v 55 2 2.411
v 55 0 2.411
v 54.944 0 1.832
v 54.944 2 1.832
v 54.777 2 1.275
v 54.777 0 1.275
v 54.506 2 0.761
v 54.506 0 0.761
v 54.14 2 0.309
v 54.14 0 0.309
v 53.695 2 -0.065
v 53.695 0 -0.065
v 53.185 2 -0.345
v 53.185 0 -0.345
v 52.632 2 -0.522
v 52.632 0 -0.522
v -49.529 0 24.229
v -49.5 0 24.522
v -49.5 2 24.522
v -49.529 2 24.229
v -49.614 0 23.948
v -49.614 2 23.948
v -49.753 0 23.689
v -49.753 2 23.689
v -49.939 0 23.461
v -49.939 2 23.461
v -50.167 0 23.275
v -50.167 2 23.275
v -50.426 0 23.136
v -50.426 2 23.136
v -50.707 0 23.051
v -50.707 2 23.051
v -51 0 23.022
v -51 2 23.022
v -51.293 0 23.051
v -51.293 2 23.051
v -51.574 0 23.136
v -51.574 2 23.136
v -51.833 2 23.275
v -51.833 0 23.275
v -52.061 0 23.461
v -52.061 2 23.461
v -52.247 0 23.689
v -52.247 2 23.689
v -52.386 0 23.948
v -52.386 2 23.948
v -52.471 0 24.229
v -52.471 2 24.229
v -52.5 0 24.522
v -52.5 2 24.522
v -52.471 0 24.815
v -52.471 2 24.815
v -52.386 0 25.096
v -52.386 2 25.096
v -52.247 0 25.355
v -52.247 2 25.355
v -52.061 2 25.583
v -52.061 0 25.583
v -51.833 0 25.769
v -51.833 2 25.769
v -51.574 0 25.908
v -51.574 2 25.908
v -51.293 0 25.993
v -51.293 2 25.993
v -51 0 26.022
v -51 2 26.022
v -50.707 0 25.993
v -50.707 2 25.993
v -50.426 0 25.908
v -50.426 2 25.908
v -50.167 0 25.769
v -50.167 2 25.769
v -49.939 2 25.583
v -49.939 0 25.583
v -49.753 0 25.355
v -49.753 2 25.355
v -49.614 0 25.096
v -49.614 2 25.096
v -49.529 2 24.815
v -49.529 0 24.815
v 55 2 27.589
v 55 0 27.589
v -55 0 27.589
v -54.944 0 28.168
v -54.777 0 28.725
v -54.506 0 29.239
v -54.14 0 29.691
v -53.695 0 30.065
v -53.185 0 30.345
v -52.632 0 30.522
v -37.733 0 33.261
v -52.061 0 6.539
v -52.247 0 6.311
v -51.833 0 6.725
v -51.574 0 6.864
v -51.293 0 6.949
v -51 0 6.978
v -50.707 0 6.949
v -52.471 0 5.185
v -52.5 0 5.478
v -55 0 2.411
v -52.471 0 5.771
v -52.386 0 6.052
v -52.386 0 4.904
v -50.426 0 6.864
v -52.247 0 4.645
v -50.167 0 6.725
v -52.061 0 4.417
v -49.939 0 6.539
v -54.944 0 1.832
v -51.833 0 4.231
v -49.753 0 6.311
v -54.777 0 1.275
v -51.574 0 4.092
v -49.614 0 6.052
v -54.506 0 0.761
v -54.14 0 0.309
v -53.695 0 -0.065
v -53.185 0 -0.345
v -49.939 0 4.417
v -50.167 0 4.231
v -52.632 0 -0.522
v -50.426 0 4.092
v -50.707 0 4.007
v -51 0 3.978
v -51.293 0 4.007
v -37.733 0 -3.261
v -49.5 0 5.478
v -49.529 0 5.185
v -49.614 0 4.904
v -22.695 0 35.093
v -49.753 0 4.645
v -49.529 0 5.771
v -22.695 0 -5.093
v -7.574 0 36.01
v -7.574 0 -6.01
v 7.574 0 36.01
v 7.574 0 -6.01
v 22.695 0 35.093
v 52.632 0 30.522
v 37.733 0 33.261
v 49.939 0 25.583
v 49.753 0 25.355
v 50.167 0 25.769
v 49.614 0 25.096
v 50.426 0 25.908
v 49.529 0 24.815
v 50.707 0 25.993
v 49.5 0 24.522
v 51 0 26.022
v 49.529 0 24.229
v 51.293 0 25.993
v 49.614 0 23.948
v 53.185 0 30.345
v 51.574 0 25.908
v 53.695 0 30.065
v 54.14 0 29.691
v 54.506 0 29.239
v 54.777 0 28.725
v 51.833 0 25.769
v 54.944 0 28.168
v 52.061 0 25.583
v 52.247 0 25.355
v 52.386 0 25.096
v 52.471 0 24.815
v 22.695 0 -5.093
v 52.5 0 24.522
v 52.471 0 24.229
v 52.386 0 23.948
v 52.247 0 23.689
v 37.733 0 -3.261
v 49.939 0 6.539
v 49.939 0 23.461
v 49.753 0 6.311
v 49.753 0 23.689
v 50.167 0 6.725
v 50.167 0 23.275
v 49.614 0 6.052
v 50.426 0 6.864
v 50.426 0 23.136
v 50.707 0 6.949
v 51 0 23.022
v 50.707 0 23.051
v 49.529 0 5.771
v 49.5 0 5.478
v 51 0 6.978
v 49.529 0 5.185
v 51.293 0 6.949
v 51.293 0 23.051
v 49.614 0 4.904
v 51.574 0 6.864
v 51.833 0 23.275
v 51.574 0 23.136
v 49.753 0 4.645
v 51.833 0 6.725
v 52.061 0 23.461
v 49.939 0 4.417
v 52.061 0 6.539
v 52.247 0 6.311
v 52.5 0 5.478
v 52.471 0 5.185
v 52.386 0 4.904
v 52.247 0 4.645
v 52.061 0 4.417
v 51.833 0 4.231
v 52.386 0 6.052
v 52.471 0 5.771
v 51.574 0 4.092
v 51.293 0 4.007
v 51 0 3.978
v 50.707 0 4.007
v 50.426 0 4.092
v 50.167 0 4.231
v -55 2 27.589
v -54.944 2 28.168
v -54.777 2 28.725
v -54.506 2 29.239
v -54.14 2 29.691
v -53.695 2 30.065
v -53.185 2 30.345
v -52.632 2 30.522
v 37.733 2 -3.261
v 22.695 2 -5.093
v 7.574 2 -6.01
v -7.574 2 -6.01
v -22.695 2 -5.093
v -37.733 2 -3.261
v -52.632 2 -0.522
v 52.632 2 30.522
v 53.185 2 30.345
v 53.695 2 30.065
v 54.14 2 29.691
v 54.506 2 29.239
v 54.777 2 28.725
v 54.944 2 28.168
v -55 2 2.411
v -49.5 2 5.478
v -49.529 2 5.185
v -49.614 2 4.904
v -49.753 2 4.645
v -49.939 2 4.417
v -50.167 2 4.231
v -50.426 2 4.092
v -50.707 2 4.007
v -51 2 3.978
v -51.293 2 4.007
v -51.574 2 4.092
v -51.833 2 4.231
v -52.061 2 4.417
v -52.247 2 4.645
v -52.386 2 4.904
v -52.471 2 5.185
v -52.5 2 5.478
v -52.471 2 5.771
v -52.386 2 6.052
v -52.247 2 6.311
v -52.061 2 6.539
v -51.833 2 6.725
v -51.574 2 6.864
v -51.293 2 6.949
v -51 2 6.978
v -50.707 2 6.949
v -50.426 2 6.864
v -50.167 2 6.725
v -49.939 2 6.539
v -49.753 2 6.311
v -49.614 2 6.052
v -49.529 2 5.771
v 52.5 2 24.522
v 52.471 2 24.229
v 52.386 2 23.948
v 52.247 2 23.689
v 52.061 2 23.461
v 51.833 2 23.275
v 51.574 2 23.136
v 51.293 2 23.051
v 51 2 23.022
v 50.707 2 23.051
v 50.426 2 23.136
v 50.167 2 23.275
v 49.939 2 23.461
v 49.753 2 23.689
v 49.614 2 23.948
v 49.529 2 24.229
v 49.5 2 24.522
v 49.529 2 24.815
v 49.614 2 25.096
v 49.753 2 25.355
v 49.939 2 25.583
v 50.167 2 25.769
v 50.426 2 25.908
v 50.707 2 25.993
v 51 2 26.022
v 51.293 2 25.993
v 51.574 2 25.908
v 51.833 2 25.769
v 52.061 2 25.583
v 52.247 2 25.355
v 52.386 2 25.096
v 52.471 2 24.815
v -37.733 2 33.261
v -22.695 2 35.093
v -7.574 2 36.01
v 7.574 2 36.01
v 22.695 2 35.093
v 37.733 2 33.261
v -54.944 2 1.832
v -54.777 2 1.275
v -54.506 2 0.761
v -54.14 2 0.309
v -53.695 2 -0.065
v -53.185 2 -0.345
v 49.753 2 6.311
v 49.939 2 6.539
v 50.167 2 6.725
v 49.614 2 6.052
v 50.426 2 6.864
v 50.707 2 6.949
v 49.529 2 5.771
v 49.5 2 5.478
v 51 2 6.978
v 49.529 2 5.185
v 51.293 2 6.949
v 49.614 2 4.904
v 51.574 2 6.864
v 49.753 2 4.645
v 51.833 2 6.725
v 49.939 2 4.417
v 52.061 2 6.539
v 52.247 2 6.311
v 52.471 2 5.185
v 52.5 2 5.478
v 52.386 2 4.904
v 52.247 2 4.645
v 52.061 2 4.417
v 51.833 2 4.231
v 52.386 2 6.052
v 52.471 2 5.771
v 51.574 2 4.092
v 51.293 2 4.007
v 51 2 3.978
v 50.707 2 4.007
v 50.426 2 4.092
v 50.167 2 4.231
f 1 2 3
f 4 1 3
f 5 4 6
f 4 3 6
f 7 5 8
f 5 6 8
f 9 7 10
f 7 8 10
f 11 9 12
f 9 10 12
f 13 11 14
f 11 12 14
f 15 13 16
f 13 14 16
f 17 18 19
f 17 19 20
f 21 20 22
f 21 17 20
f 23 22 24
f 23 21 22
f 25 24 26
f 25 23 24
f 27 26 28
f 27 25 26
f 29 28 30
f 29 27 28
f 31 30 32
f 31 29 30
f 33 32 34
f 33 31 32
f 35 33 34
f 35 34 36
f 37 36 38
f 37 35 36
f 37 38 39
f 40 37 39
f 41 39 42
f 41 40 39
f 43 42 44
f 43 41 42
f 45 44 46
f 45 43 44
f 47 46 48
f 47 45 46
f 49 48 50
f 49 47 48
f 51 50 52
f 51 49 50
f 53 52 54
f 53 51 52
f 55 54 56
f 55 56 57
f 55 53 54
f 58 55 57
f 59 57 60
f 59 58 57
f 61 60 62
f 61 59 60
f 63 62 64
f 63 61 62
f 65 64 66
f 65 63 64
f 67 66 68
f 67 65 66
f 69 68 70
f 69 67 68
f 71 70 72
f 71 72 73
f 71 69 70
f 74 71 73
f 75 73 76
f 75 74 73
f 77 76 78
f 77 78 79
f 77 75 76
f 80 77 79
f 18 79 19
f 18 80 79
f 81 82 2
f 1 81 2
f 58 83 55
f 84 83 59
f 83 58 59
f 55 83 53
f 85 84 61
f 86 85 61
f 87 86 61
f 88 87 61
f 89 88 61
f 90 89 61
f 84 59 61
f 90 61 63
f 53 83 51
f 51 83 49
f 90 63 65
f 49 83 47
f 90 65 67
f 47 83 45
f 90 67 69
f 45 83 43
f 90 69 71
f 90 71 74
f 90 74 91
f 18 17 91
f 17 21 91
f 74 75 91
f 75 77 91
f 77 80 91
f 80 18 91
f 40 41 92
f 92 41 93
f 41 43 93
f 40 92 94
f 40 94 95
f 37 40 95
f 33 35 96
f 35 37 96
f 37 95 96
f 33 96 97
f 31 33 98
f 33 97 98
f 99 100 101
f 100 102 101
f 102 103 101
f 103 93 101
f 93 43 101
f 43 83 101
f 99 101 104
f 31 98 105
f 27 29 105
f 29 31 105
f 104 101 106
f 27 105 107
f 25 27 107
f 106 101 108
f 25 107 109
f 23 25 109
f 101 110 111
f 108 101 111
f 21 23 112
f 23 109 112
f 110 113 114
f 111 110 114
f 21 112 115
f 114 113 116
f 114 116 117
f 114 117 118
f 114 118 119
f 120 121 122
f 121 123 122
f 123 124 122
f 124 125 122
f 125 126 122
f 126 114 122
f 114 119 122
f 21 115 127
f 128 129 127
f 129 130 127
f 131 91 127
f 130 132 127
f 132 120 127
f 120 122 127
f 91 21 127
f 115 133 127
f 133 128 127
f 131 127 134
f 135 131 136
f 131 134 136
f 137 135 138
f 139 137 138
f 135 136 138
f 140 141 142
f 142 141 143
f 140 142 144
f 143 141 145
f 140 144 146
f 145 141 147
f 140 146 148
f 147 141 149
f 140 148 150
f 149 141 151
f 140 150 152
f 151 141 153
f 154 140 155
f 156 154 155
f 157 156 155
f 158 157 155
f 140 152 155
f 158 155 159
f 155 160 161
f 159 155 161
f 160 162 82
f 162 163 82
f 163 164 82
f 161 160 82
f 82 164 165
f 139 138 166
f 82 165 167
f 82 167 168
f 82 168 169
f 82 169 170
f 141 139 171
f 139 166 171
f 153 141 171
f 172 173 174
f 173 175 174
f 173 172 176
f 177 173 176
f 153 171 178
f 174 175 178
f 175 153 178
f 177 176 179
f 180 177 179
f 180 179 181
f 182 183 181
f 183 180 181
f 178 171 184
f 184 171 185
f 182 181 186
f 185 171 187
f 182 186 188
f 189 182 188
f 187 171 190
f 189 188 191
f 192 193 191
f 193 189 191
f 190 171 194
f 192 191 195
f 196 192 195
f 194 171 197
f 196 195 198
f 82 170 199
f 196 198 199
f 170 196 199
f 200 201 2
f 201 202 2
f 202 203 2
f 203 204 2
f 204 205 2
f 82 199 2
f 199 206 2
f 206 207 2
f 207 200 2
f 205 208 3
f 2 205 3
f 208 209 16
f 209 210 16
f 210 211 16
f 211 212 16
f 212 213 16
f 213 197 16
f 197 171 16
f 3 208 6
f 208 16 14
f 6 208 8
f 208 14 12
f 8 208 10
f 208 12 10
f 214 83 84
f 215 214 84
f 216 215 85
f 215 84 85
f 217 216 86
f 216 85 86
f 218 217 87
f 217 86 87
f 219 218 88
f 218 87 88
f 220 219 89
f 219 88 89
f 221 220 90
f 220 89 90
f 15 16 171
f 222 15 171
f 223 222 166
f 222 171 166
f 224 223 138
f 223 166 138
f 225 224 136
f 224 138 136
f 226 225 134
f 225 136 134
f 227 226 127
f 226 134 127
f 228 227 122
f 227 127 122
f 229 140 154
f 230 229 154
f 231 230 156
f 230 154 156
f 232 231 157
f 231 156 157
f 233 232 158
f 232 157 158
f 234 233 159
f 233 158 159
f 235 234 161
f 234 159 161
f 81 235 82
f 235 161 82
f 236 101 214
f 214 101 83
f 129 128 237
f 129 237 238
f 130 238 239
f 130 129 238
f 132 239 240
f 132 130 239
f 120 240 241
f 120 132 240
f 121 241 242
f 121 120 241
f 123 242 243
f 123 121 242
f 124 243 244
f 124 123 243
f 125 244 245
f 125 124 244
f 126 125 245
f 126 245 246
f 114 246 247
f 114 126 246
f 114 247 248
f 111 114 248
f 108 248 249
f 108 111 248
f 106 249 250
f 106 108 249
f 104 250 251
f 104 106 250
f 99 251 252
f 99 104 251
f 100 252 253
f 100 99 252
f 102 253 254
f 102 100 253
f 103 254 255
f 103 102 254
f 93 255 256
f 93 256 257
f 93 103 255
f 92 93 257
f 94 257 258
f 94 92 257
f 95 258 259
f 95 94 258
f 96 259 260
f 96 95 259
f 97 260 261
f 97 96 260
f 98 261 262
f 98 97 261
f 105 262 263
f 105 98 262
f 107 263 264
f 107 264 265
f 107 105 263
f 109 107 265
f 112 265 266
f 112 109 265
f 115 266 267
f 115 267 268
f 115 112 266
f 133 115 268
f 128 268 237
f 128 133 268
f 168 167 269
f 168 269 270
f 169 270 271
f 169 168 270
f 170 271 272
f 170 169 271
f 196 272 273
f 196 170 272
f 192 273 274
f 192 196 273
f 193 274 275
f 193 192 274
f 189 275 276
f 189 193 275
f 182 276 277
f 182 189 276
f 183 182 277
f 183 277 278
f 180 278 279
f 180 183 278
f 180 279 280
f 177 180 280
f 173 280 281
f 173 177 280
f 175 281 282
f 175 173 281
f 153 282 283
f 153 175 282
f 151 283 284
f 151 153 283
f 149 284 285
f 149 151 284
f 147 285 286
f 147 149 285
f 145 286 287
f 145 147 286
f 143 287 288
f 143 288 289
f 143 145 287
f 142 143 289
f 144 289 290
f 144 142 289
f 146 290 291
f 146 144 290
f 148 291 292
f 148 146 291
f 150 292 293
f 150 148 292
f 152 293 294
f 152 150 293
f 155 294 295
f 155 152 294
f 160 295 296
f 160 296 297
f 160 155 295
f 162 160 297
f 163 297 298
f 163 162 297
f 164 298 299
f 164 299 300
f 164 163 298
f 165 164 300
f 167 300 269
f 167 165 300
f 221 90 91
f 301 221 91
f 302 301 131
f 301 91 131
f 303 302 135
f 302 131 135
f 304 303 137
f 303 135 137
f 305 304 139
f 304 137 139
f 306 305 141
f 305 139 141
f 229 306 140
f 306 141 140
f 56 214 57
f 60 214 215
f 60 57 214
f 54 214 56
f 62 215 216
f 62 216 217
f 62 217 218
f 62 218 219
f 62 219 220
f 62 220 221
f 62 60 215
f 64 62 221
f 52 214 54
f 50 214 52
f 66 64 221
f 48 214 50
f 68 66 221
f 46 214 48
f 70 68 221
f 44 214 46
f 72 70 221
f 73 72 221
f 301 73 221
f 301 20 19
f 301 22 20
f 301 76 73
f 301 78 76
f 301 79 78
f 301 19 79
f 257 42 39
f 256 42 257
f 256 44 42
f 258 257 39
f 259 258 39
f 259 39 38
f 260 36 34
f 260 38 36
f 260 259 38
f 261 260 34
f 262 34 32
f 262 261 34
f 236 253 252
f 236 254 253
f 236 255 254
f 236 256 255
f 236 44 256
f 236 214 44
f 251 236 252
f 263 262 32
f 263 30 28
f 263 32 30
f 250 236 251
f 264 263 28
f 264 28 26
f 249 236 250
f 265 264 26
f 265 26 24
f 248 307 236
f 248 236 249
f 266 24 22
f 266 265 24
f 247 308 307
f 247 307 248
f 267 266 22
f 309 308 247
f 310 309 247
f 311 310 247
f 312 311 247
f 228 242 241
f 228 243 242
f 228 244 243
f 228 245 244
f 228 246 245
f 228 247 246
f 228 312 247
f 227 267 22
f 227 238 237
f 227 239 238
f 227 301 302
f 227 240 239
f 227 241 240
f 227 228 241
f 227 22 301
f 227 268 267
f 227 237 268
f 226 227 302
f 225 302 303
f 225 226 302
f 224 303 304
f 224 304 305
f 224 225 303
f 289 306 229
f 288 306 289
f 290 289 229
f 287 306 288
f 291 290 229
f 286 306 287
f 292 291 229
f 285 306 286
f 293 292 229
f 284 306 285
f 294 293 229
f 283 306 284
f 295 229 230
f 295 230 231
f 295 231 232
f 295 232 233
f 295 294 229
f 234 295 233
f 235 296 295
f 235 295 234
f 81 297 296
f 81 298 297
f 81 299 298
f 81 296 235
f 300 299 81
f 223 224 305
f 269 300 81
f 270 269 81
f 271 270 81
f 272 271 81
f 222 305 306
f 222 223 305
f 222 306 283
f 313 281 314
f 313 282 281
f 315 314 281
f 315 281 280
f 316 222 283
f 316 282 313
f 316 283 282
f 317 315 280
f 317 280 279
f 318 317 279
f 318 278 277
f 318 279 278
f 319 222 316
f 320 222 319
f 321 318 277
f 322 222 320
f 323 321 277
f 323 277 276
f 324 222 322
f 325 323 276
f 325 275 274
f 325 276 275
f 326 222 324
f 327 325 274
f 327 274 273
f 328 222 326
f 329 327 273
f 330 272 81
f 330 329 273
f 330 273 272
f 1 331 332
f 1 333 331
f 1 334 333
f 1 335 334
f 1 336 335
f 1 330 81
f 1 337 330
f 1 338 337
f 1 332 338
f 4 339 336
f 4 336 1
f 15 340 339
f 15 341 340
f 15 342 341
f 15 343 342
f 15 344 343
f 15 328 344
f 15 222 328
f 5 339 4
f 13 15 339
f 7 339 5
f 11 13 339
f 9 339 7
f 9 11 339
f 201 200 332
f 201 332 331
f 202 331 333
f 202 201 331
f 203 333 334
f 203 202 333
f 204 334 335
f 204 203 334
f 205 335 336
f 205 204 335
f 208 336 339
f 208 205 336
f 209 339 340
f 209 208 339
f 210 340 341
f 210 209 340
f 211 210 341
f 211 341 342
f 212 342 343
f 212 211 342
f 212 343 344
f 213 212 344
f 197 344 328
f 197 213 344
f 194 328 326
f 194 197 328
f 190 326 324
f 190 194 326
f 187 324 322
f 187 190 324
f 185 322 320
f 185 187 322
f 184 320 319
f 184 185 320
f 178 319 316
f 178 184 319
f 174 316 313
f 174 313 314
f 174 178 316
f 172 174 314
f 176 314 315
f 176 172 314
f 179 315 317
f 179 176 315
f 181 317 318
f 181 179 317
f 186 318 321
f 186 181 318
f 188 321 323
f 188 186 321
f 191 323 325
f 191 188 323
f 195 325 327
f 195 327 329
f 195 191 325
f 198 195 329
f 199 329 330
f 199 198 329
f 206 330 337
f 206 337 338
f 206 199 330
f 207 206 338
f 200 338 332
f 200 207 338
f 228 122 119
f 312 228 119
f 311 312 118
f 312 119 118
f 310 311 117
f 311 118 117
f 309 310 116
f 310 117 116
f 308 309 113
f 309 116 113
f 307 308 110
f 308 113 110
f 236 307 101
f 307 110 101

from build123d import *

# Parameters (mm, degrees)
SKETCH_1_R      = 1.5
EXTRUDE_1_DEPTH = 2


with BuildPart() as part:
    # Эскиз1 → Бобышка-Вытянуть1 (new body)
    with BuildSketch(Plane(origin=(0, 0, 0), x_dir=(1, 0, 0), z_dir=(0, 1, 0))):
        with BuildLine():
            Line((-55, -2.410684892), (-55, -27.589315108))
            ThreePointArc((-55, -27.589315108), (-54.333959816, -29.474157695), (-52.631578947, -30.52207968))
            ThreePointArc((-52.631578947, -30.52207968), (0, -36.125032035), (52.631578947, -30.52207968))
            ThreePointArc((52.631578947, -30.52207968), (54.333959816, -29.474157695), (55, -27.589315108))
            Line((55, -27.589315108), (55, -2.410684892))
            ThreePointArc((55, -2.410684892), (54.333959816, -0.525842305), (52.631578947, 0.52207968))
            ThreePointArc((52.631578947, 0.52207968), (0, 6.125032035), (-52.631578947, 0.52207968))
            ThreePointArc((-52.631578947, 0.52207968), (-54.333959816, -0.525842305), (-55, -2.410684892))
        make_face()
        with Locations((-51, -5.47792032)):
            Circle(SKETCH_1_R, mode=Mode.SUBTRACT)
        with Locations((-51, -24.52207968)):
            Circle(SKETCH_1_R, mode=Mode.SUBTRACT)
        with Locations((51, -5.47792032)):
            Circle(SKETCH_1_R, mode=Mode.SUBTRACT)
        with Locations((51, -24.52207968)):
            Circle(SKETCH_1_R, mode=Mode.SUBTRACT)
    extrude(amount=EXTRUDE_1_DEPTH)


solid = part.part
